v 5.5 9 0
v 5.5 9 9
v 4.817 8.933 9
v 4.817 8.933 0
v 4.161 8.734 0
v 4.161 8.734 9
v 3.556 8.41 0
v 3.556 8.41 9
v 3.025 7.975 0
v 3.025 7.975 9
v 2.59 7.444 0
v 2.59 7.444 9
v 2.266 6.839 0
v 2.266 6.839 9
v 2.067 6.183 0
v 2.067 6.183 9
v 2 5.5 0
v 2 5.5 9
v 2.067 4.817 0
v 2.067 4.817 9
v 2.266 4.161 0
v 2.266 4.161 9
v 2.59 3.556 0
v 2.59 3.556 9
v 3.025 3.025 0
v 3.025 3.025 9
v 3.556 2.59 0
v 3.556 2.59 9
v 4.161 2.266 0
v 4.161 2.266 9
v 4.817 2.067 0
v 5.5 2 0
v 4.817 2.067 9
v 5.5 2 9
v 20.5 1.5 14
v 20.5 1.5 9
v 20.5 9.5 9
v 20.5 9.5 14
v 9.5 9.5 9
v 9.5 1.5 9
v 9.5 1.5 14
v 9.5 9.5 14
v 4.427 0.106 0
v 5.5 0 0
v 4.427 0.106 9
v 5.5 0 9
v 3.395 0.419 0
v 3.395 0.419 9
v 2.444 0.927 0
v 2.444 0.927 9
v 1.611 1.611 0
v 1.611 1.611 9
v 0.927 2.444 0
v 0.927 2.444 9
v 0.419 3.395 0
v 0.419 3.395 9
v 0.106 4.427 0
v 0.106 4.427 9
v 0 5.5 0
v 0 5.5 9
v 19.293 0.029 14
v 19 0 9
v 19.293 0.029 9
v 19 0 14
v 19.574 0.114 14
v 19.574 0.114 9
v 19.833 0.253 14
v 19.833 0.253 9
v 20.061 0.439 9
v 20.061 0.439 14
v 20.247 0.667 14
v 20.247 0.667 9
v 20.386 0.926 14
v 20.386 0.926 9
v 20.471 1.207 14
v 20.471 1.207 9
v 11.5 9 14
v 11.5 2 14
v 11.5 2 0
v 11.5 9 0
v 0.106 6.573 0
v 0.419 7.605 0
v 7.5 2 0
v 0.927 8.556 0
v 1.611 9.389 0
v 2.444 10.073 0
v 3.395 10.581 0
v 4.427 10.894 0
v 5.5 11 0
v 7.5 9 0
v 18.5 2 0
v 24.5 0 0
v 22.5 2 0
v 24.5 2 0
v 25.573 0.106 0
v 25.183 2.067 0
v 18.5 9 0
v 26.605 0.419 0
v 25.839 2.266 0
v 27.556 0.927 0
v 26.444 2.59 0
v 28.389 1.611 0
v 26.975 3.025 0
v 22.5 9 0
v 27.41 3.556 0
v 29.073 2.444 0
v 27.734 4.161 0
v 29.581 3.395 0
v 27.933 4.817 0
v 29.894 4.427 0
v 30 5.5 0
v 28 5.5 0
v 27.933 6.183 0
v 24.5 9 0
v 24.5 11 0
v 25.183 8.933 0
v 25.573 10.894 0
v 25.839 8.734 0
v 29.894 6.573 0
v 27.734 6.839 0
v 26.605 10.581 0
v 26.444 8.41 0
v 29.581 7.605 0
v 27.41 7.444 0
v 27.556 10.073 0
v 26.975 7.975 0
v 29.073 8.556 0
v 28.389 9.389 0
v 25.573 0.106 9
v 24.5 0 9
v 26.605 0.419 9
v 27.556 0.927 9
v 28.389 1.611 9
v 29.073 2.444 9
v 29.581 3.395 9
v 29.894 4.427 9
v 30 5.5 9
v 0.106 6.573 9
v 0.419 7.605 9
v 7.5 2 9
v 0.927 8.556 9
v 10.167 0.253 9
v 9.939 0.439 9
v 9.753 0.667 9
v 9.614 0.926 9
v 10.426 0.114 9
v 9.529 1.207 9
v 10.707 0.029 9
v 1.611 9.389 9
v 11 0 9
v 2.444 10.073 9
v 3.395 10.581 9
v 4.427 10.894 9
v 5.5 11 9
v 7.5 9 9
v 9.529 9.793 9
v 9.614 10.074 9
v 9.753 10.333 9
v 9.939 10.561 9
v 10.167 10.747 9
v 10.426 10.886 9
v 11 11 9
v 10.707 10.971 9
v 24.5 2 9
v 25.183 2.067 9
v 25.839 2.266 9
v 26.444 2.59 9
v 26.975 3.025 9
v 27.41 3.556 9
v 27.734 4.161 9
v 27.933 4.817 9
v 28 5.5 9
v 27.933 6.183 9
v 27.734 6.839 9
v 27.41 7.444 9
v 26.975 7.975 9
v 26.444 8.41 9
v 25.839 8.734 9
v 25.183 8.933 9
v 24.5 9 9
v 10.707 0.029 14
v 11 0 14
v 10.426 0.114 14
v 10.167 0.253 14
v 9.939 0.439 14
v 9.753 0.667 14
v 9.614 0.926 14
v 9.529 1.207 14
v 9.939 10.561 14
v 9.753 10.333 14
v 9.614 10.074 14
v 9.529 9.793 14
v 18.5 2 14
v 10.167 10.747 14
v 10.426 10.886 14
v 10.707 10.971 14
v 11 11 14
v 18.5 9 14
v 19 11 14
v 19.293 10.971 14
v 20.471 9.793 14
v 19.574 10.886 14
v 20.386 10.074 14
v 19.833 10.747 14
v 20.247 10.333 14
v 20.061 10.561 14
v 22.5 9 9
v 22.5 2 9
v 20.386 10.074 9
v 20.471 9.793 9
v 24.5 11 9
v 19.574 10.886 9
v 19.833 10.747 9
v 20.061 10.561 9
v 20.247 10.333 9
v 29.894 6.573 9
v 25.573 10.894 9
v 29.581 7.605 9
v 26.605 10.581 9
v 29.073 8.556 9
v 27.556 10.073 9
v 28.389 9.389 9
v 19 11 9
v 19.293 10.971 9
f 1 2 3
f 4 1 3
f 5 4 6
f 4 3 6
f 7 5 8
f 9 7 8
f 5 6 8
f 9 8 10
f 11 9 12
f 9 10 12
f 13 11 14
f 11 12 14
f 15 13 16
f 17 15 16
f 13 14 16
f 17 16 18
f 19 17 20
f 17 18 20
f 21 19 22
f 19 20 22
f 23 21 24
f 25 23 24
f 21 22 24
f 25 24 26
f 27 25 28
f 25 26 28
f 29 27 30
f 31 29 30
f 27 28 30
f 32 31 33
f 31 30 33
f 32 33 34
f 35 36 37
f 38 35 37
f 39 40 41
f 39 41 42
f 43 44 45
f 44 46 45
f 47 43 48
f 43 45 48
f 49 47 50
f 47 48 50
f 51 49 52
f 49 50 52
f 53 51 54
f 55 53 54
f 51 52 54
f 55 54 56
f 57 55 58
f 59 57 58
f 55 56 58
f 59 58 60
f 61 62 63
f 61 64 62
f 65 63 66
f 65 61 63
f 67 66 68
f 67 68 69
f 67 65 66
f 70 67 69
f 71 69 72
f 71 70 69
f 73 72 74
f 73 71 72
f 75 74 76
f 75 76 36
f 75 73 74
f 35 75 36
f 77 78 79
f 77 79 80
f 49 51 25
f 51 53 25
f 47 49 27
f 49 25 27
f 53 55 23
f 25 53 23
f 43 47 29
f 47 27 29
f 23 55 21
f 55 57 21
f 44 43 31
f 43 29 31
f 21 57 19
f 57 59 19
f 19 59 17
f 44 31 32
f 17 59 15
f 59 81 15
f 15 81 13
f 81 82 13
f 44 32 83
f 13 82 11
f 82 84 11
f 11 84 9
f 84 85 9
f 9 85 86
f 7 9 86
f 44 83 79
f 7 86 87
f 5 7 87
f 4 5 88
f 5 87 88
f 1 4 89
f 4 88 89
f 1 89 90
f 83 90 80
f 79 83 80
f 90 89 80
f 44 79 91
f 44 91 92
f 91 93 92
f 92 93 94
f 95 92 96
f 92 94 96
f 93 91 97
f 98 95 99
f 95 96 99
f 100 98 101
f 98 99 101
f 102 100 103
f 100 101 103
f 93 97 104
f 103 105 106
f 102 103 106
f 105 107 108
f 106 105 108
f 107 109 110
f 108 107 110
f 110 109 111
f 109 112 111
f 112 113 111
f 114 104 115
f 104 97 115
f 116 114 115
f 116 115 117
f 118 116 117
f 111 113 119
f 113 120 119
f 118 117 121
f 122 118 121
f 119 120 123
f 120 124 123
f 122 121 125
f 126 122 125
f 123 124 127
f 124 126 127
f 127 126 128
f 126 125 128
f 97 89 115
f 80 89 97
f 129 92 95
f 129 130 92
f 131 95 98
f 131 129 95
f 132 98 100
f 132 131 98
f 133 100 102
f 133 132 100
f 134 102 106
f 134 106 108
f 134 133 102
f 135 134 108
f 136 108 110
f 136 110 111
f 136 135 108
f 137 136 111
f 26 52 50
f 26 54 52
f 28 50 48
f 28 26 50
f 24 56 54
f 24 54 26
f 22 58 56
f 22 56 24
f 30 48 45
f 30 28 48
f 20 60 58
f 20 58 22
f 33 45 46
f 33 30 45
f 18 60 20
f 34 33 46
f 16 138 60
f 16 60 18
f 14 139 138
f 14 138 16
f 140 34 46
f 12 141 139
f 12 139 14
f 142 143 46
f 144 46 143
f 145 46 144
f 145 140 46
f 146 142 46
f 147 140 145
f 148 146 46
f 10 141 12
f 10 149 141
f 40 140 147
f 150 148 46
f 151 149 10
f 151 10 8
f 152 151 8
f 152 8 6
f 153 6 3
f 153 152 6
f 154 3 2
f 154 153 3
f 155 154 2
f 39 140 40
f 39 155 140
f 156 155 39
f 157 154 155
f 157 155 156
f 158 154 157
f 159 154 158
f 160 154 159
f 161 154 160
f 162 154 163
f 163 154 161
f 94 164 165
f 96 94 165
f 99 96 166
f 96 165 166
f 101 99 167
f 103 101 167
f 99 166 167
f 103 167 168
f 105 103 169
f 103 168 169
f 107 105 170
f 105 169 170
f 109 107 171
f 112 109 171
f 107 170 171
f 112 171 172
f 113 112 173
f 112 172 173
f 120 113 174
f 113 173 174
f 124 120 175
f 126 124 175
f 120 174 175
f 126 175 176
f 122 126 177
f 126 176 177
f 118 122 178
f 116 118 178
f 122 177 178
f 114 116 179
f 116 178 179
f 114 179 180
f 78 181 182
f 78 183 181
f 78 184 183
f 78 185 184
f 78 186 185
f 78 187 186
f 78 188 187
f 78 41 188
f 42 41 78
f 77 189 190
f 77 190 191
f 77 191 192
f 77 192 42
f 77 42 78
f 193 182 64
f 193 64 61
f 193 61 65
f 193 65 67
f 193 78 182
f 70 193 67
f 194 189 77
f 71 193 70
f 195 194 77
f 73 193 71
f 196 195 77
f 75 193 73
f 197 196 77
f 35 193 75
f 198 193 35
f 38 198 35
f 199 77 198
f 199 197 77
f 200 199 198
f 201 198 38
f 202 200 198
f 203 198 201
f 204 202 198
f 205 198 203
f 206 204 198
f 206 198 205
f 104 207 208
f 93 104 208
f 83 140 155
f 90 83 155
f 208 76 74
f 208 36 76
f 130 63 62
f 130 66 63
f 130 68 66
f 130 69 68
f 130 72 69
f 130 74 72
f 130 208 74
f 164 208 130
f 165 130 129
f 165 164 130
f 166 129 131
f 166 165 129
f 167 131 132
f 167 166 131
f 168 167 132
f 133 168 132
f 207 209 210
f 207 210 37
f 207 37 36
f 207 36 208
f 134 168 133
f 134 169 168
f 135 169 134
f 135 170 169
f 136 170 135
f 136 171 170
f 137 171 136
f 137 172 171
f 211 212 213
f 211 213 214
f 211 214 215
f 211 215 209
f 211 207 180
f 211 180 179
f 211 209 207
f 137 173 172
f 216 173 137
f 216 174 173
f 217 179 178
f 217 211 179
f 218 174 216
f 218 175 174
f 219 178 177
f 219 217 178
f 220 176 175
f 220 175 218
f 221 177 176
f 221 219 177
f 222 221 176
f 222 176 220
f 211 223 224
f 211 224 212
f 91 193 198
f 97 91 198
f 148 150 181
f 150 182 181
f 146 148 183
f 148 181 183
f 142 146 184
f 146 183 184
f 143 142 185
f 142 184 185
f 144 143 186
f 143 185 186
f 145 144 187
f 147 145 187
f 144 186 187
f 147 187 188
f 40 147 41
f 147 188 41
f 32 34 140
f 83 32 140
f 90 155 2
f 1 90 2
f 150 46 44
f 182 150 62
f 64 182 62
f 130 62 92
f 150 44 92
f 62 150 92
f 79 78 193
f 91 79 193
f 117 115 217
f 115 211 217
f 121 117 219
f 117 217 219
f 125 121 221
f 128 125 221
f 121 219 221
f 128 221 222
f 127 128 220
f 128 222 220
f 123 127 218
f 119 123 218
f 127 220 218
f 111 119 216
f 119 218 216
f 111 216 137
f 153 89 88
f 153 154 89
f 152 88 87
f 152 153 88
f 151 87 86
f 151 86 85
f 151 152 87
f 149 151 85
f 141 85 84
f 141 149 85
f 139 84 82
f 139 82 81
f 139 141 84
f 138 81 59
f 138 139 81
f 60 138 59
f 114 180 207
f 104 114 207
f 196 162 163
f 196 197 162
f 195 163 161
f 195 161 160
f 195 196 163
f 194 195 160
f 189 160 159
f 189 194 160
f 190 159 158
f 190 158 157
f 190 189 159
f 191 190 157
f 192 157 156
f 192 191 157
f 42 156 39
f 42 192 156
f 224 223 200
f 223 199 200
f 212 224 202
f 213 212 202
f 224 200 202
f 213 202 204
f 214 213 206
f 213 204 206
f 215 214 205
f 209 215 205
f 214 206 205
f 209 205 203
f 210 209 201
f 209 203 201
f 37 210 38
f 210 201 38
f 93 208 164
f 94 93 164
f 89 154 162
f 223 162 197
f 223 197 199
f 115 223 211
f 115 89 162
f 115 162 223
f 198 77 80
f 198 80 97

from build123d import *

# Parameters (mm, degrees)
F0_W     = 30
F0_H     = 11
F1_DEPTH = 9
F2_W     = 11
F2_H     = 11
F3_DEPTH = 5
F4_R     = 1.5
F5_R     = 5.49999
F6_W     = 7
F6_H     = 7
F7_DEPTH = 25
F9_DEPTH = 25


# Not quite as in the source:
# - a fillet or chamfer is up to 0.001 mm smaller than in the source, because OpenCascade refuses the exact size


with BuildPart() as f1:
    # F0 (on Top) → F1 (new body)
    with BuildSketch(Plane.XY):
        with Locations((15, 5.5)):
            Rectangle(F0_W, F0_H)
    extrude(amount=F1_DEPTH)

    # F2 (on face) → F3 (join)
    with BuildSketch(Plane.XY.offset(9)):
        with Locations((15, 5.5)):
            Rectangle(F2_W, F2_H)
    extrude(amount=F3_DEPTH)

    # F4
    f4_edges = [f1.edges().sort_by_distance(p)[0] for p in [
        (20.5, 11, 11.5),
        (9.5, 11, 11.5),
        (9.5, 0, 11.5),
        (20.5, 0, 11.5),
    ]]
    fillet(f4_edges, radius=F4_R)

    # F5 (radius 5.5 in the source; OpenCascade refuses exactly that, so slightly less here)
    f5_edges = [f1.edges().sort_by_distance(p)[0] for p in [
        (30, 11, 4.5),
        (30, 0, 4.5),
        (0, 11, 4.5),
        (0, 0, 4.5),
    ]]
    fillet(f5_edges, radius=F5_R)

    # F6 (on face) → F7 (cut)
    with BuildSketch(Plane.XY.offset(14)):
        with Locations((15, 5.5)):
            Rectangle(F6_W, F6_H)
    extrude(amount=-F7_DEPTH, mode=Mode.SUBTRACT)

    # F8 (on face) → F9 (cut)
    with BuildSketch(Plane.XY.offset(9)):
        with BuildLine():
            Line((24.5, 9), (22.5, 9))
            Line((22.5, 9), (22.5, 2))
            Line((22.5, 2), (24.5, 2))
            ThreePointArc((24.5, 2), (28, 5.5), (24.5, 9))
        make_face()
        with BuildLine():
            Line((7.5, 2), (7.5, 9))
            Line((7.5, 9), (5.5, 9))
            ThreePointArc((5.5, 9), (2, 5.5), (5.5, 2))
            Line((5.5, 2), (7.5, 2))
        make_face()
    extrude(amount=-F9_DEPTH, mode=Mode.SUBTRACT)


solid = f1.part
